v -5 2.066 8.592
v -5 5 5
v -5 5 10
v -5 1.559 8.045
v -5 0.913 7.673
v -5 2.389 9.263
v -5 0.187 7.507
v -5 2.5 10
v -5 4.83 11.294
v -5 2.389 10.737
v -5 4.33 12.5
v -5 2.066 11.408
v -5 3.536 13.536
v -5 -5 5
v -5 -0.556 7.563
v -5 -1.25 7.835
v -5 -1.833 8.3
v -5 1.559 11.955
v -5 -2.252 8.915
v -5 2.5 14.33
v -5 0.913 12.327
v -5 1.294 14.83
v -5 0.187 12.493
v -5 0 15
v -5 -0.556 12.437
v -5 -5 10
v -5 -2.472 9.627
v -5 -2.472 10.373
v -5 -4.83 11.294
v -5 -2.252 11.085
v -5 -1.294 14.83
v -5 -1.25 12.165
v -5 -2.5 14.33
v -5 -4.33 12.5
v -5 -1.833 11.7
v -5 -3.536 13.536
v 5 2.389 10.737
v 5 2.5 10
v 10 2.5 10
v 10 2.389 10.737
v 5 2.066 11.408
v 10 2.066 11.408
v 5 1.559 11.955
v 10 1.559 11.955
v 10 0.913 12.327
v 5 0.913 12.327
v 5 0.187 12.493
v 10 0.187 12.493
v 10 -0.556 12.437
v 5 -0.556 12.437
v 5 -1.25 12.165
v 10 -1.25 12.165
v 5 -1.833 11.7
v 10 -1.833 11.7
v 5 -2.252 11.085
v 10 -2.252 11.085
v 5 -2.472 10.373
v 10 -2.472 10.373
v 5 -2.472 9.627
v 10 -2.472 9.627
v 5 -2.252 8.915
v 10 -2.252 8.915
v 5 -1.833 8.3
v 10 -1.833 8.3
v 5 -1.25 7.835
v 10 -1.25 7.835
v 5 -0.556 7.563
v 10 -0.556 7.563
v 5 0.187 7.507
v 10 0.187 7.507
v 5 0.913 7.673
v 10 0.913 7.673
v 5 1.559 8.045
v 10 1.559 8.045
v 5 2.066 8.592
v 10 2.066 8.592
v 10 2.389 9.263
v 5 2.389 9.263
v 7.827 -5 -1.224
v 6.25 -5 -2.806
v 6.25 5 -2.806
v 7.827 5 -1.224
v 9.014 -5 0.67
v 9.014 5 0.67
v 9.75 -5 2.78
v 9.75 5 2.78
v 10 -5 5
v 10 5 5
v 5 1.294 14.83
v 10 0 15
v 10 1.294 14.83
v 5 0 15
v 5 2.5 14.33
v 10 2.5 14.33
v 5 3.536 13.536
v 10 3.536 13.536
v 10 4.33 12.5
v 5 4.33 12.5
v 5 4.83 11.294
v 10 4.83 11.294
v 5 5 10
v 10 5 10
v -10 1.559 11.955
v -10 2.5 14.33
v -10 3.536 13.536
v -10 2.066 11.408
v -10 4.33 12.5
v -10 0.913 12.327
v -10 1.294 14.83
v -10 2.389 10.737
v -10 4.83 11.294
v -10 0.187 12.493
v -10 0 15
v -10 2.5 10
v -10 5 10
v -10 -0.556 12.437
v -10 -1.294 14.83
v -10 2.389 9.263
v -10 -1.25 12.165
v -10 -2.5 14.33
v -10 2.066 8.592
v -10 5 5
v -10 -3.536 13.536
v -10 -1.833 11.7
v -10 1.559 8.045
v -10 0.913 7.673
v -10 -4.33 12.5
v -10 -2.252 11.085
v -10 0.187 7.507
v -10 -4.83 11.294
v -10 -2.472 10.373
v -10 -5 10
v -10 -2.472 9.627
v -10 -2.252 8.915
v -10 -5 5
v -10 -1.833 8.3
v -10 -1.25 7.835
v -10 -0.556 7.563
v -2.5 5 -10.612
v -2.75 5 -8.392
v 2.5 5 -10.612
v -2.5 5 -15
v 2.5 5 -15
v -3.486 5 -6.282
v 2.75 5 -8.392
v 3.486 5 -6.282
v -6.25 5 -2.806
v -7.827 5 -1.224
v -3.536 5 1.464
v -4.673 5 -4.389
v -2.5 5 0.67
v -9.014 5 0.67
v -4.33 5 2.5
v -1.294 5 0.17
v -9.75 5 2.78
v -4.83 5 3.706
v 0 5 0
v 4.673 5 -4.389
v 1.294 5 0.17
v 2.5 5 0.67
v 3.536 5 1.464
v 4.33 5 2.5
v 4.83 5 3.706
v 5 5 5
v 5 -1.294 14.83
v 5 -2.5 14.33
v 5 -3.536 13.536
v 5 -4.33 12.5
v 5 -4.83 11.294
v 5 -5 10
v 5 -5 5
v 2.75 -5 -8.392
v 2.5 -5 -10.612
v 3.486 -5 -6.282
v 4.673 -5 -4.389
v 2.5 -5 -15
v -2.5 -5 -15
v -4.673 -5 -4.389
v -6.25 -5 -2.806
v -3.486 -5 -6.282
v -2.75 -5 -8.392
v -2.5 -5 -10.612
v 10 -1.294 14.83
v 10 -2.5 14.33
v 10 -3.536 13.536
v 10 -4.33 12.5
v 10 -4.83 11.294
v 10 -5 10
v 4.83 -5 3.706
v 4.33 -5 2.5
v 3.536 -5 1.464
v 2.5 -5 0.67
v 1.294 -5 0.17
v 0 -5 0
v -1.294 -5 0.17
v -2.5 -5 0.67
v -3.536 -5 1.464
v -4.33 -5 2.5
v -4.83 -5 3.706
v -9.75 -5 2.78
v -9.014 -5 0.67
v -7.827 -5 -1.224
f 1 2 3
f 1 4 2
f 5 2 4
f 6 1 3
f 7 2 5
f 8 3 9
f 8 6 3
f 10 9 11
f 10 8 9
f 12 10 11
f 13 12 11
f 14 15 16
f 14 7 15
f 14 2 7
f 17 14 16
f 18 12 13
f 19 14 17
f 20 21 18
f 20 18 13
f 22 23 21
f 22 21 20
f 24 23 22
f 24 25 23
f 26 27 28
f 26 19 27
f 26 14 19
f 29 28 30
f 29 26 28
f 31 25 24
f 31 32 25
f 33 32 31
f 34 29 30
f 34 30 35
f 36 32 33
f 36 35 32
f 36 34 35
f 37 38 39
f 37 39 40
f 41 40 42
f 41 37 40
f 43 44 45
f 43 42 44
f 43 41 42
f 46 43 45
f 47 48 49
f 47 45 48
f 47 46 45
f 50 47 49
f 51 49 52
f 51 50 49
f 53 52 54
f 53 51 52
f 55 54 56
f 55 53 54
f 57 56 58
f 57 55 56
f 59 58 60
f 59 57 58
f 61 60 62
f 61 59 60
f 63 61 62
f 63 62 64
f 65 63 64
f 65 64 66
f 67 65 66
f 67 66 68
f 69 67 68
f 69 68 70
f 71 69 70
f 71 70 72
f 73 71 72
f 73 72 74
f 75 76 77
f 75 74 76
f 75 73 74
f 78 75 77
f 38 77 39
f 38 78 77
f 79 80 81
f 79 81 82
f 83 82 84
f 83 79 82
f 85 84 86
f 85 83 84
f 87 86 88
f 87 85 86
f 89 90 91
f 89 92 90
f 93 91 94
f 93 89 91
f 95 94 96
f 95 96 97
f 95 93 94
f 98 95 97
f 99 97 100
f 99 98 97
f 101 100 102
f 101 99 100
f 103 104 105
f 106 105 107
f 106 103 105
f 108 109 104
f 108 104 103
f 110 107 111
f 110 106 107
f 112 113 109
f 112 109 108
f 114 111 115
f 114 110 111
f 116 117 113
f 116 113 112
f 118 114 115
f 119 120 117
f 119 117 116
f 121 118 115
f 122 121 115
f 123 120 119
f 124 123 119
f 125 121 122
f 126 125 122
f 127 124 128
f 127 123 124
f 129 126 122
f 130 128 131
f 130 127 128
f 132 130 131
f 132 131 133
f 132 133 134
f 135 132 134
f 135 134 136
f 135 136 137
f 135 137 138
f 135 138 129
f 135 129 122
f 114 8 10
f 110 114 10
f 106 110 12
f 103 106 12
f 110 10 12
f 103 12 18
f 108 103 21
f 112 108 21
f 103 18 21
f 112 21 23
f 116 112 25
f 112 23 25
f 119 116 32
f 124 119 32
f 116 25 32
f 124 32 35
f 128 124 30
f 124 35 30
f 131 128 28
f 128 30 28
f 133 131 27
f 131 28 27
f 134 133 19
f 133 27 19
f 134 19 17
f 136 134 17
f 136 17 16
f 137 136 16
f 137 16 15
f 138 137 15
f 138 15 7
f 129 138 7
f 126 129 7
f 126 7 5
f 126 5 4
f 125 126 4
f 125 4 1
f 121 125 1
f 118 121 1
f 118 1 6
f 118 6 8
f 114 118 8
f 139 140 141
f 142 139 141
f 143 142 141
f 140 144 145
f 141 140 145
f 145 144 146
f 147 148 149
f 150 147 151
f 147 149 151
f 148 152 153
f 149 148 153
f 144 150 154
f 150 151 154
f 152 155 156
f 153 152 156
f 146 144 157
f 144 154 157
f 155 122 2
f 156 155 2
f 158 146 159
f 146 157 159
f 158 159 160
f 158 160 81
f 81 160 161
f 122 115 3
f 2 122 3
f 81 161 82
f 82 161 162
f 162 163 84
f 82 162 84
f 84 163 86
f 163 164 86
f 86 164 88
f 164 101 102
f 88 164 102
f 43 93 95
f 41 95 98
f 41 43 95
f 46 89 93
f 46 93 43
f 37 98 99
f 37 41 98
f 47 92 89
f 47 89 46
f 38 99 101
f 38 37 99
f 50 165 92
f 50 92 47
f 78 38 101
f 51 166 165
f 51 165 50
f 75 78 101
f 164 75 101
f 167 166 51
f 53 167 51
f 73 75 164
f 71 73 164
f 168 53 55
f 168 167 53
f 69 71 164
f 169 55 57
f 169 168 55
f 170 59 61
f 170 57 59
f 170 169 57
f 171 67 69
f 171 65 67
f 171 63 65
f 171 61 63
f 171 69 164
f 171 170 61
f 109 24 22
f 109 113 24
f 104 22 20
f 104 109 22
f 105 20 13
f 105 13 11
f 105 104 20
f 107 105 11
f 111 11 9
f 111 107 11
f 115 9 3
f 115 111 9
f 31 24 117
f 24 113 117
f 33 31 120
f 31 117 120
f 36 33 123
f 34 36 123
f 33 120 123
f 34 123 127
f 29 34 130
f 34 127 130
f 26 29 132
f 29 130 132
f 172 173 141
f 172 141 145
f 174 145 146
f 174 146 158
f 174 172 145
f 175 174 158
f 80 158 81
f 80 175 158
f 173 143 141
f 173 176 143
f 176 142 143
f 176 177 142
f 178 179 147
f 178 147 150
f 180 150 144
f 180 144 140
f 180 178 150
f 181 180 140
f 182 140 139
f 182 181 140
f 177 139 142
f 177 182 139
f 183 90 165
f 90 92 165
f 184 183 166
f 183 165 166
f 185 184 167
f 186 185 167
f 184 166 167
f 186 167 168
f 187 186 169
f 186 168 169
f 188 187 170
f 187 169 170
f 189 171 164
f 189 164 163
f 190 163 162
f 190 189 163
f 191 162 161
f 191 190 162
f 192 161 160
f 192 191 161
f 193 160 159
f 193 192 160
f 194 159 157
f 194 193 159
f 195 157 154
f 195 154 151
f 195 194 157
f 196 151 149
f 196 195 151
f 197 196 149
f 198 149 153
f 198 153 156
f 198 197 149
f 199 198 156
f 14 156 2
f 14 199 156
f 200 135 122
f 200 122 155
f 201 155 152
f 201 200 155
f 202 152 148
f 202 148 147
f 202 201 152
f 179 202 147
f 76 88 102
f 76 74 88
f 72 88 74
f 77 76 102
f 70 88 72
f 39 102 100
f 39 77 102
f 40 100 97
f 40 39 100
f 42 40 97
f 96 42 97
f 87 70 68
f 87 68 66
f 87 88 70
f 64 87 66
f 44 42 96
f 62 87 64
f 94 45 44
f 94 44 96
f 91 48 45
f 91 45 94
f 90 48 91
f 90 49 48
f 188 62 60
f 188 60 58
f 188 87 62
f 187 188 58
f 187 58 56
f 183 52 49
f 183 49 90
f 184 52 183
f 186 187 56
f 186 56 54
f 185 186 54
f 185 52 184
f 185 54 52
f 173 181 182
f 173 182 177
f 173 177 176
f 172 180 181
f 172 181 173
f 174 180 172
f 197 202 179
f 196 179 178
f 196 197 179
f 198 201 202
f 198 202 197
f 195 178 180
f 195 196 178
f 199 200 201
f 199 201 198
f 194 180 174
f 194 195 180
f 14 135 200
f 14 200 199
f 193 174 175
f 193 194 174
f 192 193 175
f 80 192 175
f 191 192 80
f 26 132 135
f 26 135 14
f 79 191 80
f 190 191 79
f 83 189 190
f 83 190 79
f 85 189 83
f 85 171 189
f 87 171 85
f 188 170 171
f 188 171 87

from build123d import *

# Parameters (mm, degrees)
F1_DEPTH      = 5
F2_R          = 4.99999
F3_R          = 2.5
F4_DEPTH      = 10.001
F4_DEPTH_BACK = 10.001


# Not quite as in the source:
# - a fillet or chamfer is up to 0.001 mm smaller than in the source, because OpenCascade refuses the exact size


with BuildPart() as f1:
    # F0 (on Front) → F1 (new body, symmetric)
    with BuildSketch(Plane.XZ):
        with BuildLine():
            Line((0, -15), (2.5, -15))
            Line((2.5, -15), (2.5, -10.612494996))
            ThreePointArc((2.5, -10.612494996), (3.4861218113, -6.2823679771), (6.25, -2.806247498))
            ThreePointArc((6.25, -2.806247498), (9.0138781887, 0.6698729811), (10, 5))
            Line((10, 5), (10, 15))
            Line((10, 15), (5, 15))
            Line((5, 15), (5, 5))
            ThreePointArc((5, 5), (3.5355339059, 1.4644660941), (0, 0))
            ThreePointArc((0, 0), (-3.5355339059, 1.4644660941), (-5, 5))
            Line((-5, 5), (-5, 15))
            Line((-5, 15), (-10, 15))
            Line((-10, 15), (-10, 5))
            ThreePointArc((-10, 5), (-9.0138781887, 0.6698729811), (-6.25, -2.806247498))
            ThreePointArc((-6.25, -2.806247498), (-3.4861218113, -6.2823679771), (-2.5, -10.612494996))
            Line((-2.5, -10.612494996), (-2.5, -15))
            Line((-2.5, -15), (0, -15))
        make_face()
    extrude(amount=F1_DEPTH, both=True)

    # F2 (radius 5 in the source; OpenCascade refuses exactly that, so slightly less here)
    f2_edges = [f1.edges().sort_by_distance(p)[0] for p in [
        (-7.5, -5, 15),
        (7.5, -5, 15),
        (7.5, 5, 15),
        (-7.5, 5, 15),
    ]]
    fillet(f2_edges, radius=F2_R)

    # F3 (on Right) → F4 (cut, two sides)
    with BuildSketch(Plane.YZ) as f4_sk:
        with Locations((0, 10)):
            Circle(F3_R)
    extrude(amount=-F4_DEPTH, mode=Mode.SUBTRACT)
    extrude(f4_sk.sketch, amount=F4_DEPTH_BACK, mode=Mode.SUBTRACT)


solid = f1.part
